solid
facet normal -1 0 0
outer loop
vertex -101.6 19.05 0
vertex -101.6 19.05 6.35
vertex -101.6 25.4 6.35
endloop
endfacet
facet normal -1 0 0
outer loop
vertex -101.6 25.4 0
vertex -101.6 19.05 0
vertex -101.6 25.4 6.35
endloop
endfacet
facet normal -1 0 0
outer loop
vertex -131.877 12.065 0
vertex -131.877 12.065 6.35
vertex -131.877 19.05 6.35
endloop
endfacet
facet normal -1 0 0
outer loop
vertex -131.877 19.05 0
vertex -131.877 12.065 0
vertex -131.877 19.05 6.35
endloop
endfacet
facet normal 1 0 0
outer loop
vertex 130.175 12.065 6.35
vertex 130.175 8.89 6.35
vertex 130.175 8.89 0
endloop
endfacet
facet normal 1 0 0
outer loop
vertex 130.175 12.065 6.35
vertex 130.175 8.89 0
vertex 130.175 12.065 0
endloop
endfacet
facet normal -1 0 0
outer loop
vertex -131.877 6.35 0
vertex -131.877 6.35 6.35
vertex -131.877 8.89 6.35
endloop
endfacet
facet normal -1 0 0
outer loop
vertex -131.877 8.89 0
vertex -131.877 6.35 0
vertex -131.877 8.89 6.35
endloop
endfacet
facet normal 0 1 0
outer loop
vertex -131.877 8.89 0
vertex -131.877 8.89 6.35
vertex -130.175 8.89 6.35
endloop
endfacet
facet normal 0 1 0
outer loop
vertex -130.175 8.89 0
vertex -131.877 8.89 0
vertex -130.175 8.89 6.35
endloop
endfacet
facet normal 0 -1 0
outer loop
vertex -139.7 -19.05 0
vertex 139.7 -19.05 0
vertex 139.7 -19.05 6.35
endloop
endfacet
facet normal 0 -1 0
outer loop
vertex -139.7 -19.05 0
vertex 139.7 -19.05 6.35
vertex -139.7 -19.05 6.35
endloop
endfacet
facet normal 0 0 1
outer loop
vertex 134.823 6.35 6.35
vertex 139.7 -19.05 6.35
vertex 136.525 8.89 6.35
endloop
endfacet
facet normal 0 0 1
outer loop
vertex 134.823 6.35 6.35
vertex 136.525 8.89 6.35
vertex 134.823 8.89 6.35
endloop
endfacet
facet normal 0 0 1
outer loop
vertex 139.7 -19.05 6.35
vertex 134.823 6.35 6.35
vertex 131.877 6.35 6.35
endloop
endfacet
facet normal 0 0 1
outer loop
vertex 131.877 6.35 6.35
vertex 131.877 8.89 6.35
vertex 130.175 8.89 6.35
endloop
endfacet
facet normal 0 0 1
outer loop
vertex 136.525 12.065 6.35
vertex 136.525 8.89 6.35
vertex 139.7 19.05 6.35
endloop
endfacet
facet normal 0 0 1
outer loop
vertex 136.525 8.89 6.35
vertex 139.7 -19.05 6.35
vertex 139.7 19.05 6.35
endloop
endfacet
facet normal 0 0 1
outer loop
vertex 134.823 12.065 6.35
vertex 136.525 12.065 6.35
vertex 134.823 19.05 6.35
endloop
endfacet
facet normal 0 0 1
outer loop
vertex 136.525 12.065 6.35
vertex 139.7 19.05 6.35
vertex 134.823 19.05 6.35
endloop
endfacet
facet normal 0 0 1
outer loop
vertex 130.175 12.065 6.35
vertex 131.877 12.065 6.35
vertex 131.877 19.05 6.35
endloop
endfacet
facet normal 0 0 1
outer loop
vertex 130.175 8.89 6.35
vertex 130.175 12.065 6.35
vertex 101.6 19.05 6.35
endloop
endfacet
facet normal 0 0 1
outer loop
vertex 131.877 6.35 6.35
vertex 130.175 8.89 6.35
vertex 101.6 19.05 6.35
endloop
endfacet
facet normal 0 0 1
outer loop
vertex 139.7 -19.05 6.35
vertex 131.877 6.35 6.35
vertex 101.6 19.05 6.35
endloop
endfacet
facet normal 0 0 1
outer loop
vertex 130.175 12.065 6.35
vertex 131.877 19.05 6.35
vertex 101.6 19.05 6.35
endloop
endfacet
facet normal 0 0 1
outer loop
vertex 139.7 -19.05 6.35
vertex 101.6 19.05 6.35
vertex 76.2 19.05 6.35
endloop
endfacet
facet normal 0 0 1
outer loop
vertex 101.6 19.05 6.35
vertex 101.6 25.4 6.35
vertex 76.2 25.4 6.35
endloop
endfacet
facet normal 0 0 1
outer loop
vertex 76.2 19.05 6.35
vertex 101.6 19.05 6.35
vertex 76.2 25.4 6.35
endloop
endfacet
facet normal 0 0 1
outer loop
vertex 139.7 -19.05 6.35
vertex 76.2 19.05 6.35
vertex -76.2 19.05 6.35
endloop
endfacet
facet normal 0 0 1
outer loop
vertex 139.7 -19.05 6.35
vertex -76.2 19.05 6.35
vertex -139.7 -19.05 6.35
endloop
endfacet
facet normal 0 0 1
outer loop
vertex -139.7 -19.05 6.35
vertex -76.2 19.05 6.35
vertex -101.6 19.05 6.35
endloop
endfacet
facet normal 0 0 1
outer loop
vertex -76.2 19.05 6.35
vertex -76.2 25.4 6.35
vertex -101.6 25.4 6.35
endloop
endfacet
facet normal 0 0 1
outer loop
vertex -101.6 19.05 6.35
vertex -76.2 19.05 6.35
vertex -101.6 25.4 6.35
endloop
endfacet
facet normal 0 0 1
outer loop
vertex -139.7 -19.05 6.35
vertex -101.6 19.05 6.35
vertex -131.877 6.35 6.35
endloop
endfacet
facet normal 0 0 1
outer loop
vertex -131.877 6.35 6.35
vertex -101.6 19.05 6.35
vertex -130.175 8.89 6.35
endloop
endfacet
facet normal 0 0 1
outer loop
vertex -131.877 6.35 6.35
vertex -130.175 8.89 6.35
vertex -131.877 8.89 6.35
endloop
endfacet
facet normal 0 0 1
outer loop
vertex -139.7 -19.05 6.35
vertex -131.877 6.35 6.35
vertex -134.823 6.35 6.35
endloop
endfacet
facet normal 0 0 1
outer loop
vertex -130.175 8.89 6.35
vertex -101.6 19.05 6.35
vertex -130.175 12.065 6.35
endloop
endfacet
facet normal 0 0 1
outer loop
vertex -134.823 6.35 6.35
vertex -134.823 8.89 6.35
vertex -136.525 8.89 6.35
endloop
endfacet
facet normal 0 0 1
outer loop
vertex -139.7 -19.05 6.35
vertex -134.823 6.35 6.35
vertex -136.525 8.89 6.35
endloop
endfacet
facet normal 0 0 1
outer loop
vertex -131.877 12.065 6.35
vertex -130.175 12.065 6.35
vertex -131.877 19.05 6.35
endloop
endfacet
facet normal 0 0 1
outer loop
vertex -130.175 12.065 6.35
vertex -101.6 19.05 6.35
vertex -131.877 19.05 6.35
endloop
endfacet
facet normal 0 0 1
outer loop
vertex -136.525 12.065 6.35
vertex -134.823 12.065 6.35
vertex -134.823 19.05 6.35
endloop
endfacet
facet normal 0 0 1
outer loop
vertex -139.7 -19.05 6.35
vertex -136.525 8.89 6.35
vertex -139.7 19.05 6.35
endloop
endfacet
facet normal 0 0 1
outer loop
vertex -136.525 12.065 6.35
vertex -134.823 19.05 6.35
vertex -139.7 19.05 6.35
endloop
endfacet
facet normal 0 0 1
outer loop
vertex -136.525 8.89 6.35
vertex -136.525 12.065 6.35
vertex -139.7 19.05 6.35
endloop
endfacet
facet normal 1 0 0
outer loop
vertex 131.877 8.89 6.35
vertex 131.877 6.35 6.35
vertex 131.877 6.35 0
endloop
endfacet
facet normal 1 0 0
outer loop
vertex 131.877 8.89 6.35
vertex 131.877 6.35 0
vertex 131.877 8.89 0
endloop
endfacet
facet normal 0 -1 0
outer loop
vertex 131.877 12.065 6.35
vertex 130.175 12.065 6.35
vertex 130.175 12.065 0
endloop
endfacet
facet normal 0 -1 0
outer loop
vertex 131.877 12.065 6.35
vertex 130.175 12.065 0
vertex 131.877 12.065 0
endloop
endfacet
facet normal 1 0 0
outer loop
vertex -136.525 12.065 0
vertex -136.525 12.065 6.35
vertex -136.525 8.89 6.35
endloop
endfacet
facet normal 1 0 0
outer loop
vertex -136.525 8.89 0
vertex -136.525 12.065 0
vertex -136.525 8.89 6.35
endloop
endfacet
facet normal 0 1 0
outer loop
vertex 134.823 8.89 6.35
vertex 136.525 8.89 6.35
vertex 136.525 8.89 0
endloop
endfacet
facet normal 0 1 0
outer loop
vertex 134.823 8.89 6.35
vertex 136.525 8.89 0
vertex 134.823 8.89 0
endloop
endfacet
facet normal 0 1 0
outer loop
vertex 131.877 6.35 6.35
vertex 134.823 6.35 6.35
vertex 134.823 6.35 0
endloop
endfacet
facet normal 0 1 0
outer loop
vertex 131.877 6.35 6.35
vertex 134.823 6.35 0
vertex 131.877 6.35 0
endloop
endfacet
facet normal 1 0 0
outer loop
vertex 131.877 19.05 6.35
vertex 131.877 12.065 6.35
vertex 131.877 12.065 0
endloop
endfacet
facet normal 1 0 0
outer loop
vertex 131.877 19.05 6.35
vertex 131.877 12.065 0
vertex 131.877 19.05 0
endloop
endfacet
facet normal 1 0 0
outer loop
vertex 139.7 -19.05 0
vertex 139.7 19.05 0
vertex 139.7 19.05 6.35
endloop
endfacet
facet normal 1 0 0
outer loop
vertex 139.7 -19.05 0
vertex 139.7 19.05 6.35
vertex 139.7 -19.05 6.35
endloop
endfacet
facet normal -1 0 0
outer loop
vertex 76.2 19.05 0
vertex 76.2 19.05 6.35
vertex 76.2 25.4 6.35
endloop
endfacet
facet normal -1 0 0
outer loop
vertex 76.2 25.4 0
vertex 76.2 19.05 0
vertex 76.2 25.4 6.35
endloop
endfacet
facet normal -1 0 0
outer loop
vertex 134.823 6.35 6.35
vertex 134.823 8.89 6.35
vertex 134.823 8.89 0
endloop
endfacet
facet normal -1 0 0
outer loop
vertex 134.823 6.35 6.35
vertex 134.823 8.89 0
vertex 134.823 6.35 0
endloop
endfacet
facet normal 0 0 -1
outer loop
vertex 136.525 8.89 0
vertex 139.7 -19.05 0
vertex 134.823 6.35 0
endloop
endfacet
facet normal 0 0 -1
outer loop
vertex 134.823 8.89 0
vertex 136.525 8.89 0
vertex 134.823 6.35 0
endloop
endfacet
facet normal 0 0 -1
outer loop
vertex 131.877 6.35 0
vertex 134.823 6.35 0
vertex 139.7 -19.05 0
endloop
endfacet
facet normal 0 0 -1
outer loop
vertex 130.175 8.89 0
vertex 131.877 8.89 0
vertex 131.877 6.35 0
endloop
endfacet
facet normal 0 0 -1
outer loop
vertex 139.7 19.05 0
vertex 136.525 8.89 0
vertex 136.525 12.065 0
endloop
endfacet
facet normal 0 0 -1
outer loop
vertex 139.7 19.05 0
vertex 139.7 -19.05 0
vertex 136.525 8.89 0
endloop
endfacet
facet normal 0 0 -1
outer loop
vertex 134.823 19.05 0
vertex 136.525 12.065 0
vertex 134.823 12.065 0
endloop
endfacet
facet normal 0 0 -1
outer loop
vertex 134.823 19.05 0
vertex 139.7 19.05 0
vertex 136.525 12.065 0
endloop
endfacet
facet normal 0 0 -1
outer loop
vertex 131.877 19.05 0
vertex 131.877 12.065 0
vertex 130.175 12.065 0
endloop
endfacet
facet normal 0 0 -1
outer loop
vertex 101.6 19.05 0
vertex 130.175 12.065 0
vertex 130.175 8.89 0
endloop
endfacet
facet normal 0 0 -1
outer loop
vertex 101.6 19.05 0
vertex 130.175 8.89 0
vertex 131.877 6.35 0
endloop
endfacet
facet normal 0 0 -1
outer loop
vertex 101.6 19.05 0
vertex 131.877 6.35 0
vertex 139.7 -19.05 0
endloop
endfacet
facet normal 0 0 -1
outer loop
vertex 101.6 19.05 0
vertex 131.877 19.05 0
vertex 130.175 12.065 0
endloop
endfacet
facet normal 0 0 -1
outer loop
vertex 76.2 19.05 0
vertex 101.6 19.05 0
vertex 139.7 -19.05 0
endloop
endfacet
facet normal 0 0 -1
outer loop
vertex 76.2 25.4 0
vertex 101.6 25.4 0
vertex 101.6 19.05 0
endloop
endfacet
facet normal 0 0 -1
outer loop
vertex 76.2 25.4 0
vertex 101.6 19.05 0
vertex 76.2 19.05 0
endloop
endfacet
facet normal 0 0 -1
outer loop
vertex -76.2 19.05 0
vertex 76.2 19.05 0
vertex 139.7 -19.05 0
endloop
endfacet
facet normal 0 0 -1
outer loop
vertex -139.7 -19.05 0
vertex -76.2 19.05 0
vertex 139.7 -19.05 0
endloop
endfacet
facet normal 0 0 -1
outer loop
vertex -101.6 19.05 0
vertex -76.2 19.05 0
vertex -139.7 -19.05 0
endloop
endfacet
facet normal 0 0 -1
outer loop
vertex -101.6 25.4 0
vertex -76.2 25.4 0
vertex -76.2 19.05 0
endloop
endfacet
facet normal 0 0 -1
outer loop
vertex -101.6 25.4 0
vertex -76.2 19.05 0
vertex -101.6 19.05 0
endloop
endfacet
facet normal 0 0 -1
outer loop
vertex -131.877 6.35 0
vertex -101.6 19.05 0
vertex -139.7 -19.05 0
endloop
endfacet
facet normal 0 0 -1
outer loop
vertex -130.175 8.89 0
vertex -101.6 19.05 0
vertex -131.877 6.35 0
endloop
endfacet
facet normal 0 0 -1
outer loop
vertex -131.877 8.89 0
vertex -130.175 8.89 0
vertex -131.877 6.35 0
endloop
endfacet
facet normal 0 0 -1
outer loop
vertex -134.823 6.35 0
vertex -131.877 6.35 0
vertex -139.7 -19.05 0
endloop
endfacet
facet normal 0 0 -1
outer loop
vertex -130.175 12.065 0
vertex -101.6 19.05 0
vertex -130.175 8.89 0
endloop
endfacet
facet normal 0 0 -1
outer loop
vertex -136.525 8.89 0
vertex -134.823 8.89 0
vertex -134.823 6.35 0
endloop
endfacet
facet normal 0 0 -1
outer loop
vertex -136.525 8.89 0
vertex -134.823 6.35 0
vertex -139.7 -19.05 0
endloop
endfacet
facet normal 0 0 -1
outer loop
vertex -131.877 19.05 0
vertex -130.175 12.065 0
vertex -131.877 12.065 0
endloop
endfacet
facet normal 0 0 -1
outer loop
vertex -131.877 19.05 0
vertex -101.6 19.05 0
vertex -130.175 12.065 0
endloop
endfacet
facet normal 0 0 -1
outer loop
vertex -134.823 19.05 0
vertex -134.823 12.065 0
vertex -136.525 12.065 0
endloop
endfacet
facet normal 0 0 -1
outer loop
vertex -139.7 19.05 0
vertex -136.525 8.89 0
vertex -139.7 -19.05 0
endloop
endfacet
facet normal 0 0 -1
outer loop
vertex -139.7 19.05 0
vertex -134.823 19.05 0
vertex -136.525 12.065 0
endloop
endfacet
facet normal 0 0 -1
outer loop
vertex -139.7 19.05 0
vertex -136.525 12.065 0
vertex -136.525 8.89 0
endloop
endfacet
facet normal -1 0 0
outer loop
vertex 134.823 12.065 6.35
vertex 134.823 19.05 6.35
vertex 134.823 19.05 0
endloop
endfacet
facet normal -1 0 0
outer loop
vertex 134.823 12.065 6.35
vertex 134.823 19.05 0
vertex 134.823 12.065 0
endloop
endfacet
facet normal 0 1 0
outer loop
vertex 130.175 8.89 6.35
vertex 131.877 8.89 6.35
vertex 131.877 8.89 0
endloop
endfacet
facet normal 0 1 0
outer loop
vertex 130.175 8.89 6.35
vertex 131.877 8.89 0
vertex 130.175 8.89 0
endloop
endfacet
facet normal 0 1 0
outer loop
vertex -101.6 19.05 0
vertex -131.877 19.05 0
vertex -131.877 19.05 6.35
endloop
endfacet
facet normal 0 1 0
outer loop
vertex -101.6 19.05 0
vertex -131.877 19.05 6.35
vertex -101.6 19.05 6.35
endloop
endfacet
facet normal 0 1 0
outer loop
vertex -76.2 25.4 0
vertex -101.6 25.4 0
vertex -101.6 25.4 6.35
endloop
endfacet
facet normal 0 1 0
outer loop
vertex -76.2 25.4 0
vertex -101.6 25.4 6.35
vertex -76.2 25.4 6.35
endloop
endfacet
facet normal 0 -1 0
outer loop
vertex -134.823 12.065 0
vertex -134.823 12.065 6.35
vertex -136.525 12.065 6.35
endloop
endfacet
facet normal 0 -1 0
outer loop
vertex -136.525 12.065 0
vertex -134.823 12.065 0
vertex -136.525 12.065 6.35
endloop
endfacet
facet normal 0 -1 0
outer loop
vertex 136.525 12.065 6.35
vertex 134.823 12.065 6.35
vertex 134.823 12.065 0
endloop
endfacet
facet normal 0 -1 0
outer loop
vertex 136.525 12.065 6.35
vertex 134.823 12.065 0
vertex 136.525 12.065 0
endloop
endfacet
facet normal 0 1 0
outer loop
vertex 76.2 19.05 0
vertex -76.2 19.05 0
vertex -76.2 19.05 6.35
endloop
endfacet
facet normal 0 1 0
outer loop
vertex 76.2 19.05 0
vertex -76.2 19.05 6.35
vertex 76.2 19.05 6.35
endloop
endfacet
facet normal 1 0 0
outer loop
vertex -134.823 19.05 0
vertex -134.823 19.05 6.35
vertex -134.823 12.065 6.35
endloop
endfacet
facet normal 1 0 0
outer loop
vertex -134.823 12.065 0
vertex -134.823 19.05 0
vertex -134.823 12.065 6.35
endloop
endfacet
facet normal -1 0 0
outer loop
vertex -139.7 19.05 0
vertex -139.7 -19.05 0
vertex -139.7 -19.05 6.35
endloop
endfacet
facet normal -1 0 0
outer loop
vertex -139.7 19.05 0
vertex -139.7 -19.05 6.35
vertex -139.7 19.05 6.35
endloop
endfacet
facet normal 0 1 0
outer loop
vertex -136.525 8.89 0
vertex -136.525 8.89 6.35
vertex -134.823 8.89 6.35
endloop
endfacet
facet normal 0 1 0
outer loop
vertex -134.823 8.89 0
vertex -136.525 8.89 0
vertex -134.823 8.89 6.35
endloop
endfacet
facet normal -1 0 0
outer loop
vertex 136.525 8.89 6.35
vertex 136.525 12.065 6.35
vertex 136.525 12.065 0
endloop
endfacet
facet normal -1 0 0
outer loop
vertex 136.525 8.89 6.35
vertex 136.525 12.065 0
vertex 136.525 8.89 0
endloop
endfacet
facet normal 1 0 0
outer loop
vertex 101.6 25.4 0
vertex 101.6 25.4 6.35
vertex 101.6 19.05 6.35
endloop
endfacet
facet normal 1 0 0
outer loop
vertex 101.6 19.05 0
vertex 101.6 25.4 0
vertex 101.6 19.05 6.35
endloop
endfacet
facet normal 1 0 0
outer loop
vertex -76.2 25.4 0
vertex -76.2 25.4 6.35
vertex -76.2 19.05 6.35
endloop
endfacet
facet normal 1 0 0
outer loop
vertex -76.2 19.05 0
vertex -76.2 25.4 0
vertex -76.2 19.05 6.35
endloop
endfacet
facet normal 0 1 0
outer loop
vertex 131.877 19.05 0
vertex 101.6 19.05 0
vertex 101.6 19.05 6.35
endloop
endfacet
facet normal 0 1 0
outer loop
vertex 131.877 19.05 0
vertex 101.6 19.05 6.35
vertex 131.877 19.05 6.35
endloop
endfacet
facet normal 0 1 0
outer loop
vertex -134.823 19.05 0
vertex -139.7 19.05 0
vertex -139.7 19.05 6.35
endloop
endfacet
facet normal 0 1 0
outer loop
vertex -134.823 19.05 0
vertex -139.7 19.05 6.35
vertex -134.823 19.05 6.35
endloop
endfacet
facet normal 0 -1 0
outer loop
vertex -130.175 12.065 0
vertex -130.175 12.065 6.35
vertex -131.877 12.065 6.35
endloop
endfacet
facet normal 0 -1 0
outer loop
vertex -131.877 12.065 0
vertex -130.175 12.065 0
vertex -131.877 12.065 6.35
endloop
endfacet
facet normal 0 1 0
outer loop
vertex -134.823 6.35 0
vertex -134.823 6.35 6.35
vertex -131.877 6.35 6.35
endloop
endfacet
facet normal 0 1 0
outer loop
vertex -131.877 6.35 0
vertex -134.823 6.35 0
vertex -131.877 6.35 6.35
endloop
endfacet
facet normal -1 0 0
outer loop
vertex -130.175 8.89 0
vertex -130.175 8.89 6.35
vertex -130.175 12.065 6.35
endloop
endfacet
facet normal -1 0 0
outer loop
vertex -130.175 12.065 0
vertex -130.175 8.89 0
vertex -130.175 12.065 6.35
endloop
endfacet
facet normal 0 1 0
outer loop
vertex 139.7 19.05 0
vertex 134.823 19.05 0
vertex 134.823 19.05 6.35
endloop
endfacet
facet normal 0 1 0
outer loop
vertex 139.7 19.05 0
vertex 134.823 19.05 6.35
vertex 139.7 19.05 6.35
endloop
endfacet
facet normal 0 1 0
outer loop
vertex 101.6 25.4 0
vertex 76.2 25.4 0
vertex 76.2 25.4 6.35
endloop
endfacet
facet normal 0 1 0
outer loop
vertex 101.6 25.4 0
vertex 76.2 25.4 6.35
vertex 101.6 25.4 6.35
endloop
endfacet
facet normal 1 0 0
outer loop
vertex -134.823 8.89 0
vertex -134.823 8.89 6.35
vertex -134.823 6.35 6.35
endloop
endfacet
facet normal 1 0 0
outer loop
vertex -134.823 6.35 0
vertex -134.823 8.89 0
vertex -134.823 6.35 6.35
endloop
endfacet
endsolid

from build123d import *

# Parameters (mm, degrees)
BOSS_EXTRUDE1_DEPTH = 6.35
CUT_EXTRUDE1_DEPTH  = 6.35


with BuildPart() as part:
    # Sketch1 → Boss-Extrude1 (new body)
    with BuildSketch(Plane.XY):
        Polygon((-101.6, 19.05), (-101.6, 25.4), (-76.2, 25.4), (-76.2, 19.05), (76.2, 19.05), (76.2, 25.4), (101.6, 25.4), (101.6, 19.05), (139.7, 19.05), (139.7, -19.05), (-139.7, -19.05), (-139.7, 19.05), align=None)
    extrude(amount=BOSS_EXTRUDE1_DEPTH)

    # Sketch2 → Cut-Extrude1 (cut)
    with BuildSketch(Plane.XY.offset(6.35)):
        Polygon((-134.8232, 19.05), (-134.8232, 12.065), (-136.525, 12.065), (-136.525, 8.89), (-134.8232, 8.89), (-134.8232, 6.35), (-131.8768, 6.35), (-131.8768, 8.89), (-130.175, 8.89), (-130.175, 12.065), (-131.8768, 12.065), (-131.8768, 19.05), align=None)
        Polygon((131.8768, 12.065), (131.8768, 19.05), (134.8232, 19.05), (134.8232, 12.065), (136.525, 12.065), (136.525, 8.89), (134.8232, 8.89), (134.8232, 6.35), (131.8768, 6.35), (131.8768, 8.89), (130.175, 8.89), (130.175, 12.065), align=None)
    extrude(amount=-CUT_EXTRUDE1_DEPTH, mode=Mode.SUBTRACT)


solid = part.part
